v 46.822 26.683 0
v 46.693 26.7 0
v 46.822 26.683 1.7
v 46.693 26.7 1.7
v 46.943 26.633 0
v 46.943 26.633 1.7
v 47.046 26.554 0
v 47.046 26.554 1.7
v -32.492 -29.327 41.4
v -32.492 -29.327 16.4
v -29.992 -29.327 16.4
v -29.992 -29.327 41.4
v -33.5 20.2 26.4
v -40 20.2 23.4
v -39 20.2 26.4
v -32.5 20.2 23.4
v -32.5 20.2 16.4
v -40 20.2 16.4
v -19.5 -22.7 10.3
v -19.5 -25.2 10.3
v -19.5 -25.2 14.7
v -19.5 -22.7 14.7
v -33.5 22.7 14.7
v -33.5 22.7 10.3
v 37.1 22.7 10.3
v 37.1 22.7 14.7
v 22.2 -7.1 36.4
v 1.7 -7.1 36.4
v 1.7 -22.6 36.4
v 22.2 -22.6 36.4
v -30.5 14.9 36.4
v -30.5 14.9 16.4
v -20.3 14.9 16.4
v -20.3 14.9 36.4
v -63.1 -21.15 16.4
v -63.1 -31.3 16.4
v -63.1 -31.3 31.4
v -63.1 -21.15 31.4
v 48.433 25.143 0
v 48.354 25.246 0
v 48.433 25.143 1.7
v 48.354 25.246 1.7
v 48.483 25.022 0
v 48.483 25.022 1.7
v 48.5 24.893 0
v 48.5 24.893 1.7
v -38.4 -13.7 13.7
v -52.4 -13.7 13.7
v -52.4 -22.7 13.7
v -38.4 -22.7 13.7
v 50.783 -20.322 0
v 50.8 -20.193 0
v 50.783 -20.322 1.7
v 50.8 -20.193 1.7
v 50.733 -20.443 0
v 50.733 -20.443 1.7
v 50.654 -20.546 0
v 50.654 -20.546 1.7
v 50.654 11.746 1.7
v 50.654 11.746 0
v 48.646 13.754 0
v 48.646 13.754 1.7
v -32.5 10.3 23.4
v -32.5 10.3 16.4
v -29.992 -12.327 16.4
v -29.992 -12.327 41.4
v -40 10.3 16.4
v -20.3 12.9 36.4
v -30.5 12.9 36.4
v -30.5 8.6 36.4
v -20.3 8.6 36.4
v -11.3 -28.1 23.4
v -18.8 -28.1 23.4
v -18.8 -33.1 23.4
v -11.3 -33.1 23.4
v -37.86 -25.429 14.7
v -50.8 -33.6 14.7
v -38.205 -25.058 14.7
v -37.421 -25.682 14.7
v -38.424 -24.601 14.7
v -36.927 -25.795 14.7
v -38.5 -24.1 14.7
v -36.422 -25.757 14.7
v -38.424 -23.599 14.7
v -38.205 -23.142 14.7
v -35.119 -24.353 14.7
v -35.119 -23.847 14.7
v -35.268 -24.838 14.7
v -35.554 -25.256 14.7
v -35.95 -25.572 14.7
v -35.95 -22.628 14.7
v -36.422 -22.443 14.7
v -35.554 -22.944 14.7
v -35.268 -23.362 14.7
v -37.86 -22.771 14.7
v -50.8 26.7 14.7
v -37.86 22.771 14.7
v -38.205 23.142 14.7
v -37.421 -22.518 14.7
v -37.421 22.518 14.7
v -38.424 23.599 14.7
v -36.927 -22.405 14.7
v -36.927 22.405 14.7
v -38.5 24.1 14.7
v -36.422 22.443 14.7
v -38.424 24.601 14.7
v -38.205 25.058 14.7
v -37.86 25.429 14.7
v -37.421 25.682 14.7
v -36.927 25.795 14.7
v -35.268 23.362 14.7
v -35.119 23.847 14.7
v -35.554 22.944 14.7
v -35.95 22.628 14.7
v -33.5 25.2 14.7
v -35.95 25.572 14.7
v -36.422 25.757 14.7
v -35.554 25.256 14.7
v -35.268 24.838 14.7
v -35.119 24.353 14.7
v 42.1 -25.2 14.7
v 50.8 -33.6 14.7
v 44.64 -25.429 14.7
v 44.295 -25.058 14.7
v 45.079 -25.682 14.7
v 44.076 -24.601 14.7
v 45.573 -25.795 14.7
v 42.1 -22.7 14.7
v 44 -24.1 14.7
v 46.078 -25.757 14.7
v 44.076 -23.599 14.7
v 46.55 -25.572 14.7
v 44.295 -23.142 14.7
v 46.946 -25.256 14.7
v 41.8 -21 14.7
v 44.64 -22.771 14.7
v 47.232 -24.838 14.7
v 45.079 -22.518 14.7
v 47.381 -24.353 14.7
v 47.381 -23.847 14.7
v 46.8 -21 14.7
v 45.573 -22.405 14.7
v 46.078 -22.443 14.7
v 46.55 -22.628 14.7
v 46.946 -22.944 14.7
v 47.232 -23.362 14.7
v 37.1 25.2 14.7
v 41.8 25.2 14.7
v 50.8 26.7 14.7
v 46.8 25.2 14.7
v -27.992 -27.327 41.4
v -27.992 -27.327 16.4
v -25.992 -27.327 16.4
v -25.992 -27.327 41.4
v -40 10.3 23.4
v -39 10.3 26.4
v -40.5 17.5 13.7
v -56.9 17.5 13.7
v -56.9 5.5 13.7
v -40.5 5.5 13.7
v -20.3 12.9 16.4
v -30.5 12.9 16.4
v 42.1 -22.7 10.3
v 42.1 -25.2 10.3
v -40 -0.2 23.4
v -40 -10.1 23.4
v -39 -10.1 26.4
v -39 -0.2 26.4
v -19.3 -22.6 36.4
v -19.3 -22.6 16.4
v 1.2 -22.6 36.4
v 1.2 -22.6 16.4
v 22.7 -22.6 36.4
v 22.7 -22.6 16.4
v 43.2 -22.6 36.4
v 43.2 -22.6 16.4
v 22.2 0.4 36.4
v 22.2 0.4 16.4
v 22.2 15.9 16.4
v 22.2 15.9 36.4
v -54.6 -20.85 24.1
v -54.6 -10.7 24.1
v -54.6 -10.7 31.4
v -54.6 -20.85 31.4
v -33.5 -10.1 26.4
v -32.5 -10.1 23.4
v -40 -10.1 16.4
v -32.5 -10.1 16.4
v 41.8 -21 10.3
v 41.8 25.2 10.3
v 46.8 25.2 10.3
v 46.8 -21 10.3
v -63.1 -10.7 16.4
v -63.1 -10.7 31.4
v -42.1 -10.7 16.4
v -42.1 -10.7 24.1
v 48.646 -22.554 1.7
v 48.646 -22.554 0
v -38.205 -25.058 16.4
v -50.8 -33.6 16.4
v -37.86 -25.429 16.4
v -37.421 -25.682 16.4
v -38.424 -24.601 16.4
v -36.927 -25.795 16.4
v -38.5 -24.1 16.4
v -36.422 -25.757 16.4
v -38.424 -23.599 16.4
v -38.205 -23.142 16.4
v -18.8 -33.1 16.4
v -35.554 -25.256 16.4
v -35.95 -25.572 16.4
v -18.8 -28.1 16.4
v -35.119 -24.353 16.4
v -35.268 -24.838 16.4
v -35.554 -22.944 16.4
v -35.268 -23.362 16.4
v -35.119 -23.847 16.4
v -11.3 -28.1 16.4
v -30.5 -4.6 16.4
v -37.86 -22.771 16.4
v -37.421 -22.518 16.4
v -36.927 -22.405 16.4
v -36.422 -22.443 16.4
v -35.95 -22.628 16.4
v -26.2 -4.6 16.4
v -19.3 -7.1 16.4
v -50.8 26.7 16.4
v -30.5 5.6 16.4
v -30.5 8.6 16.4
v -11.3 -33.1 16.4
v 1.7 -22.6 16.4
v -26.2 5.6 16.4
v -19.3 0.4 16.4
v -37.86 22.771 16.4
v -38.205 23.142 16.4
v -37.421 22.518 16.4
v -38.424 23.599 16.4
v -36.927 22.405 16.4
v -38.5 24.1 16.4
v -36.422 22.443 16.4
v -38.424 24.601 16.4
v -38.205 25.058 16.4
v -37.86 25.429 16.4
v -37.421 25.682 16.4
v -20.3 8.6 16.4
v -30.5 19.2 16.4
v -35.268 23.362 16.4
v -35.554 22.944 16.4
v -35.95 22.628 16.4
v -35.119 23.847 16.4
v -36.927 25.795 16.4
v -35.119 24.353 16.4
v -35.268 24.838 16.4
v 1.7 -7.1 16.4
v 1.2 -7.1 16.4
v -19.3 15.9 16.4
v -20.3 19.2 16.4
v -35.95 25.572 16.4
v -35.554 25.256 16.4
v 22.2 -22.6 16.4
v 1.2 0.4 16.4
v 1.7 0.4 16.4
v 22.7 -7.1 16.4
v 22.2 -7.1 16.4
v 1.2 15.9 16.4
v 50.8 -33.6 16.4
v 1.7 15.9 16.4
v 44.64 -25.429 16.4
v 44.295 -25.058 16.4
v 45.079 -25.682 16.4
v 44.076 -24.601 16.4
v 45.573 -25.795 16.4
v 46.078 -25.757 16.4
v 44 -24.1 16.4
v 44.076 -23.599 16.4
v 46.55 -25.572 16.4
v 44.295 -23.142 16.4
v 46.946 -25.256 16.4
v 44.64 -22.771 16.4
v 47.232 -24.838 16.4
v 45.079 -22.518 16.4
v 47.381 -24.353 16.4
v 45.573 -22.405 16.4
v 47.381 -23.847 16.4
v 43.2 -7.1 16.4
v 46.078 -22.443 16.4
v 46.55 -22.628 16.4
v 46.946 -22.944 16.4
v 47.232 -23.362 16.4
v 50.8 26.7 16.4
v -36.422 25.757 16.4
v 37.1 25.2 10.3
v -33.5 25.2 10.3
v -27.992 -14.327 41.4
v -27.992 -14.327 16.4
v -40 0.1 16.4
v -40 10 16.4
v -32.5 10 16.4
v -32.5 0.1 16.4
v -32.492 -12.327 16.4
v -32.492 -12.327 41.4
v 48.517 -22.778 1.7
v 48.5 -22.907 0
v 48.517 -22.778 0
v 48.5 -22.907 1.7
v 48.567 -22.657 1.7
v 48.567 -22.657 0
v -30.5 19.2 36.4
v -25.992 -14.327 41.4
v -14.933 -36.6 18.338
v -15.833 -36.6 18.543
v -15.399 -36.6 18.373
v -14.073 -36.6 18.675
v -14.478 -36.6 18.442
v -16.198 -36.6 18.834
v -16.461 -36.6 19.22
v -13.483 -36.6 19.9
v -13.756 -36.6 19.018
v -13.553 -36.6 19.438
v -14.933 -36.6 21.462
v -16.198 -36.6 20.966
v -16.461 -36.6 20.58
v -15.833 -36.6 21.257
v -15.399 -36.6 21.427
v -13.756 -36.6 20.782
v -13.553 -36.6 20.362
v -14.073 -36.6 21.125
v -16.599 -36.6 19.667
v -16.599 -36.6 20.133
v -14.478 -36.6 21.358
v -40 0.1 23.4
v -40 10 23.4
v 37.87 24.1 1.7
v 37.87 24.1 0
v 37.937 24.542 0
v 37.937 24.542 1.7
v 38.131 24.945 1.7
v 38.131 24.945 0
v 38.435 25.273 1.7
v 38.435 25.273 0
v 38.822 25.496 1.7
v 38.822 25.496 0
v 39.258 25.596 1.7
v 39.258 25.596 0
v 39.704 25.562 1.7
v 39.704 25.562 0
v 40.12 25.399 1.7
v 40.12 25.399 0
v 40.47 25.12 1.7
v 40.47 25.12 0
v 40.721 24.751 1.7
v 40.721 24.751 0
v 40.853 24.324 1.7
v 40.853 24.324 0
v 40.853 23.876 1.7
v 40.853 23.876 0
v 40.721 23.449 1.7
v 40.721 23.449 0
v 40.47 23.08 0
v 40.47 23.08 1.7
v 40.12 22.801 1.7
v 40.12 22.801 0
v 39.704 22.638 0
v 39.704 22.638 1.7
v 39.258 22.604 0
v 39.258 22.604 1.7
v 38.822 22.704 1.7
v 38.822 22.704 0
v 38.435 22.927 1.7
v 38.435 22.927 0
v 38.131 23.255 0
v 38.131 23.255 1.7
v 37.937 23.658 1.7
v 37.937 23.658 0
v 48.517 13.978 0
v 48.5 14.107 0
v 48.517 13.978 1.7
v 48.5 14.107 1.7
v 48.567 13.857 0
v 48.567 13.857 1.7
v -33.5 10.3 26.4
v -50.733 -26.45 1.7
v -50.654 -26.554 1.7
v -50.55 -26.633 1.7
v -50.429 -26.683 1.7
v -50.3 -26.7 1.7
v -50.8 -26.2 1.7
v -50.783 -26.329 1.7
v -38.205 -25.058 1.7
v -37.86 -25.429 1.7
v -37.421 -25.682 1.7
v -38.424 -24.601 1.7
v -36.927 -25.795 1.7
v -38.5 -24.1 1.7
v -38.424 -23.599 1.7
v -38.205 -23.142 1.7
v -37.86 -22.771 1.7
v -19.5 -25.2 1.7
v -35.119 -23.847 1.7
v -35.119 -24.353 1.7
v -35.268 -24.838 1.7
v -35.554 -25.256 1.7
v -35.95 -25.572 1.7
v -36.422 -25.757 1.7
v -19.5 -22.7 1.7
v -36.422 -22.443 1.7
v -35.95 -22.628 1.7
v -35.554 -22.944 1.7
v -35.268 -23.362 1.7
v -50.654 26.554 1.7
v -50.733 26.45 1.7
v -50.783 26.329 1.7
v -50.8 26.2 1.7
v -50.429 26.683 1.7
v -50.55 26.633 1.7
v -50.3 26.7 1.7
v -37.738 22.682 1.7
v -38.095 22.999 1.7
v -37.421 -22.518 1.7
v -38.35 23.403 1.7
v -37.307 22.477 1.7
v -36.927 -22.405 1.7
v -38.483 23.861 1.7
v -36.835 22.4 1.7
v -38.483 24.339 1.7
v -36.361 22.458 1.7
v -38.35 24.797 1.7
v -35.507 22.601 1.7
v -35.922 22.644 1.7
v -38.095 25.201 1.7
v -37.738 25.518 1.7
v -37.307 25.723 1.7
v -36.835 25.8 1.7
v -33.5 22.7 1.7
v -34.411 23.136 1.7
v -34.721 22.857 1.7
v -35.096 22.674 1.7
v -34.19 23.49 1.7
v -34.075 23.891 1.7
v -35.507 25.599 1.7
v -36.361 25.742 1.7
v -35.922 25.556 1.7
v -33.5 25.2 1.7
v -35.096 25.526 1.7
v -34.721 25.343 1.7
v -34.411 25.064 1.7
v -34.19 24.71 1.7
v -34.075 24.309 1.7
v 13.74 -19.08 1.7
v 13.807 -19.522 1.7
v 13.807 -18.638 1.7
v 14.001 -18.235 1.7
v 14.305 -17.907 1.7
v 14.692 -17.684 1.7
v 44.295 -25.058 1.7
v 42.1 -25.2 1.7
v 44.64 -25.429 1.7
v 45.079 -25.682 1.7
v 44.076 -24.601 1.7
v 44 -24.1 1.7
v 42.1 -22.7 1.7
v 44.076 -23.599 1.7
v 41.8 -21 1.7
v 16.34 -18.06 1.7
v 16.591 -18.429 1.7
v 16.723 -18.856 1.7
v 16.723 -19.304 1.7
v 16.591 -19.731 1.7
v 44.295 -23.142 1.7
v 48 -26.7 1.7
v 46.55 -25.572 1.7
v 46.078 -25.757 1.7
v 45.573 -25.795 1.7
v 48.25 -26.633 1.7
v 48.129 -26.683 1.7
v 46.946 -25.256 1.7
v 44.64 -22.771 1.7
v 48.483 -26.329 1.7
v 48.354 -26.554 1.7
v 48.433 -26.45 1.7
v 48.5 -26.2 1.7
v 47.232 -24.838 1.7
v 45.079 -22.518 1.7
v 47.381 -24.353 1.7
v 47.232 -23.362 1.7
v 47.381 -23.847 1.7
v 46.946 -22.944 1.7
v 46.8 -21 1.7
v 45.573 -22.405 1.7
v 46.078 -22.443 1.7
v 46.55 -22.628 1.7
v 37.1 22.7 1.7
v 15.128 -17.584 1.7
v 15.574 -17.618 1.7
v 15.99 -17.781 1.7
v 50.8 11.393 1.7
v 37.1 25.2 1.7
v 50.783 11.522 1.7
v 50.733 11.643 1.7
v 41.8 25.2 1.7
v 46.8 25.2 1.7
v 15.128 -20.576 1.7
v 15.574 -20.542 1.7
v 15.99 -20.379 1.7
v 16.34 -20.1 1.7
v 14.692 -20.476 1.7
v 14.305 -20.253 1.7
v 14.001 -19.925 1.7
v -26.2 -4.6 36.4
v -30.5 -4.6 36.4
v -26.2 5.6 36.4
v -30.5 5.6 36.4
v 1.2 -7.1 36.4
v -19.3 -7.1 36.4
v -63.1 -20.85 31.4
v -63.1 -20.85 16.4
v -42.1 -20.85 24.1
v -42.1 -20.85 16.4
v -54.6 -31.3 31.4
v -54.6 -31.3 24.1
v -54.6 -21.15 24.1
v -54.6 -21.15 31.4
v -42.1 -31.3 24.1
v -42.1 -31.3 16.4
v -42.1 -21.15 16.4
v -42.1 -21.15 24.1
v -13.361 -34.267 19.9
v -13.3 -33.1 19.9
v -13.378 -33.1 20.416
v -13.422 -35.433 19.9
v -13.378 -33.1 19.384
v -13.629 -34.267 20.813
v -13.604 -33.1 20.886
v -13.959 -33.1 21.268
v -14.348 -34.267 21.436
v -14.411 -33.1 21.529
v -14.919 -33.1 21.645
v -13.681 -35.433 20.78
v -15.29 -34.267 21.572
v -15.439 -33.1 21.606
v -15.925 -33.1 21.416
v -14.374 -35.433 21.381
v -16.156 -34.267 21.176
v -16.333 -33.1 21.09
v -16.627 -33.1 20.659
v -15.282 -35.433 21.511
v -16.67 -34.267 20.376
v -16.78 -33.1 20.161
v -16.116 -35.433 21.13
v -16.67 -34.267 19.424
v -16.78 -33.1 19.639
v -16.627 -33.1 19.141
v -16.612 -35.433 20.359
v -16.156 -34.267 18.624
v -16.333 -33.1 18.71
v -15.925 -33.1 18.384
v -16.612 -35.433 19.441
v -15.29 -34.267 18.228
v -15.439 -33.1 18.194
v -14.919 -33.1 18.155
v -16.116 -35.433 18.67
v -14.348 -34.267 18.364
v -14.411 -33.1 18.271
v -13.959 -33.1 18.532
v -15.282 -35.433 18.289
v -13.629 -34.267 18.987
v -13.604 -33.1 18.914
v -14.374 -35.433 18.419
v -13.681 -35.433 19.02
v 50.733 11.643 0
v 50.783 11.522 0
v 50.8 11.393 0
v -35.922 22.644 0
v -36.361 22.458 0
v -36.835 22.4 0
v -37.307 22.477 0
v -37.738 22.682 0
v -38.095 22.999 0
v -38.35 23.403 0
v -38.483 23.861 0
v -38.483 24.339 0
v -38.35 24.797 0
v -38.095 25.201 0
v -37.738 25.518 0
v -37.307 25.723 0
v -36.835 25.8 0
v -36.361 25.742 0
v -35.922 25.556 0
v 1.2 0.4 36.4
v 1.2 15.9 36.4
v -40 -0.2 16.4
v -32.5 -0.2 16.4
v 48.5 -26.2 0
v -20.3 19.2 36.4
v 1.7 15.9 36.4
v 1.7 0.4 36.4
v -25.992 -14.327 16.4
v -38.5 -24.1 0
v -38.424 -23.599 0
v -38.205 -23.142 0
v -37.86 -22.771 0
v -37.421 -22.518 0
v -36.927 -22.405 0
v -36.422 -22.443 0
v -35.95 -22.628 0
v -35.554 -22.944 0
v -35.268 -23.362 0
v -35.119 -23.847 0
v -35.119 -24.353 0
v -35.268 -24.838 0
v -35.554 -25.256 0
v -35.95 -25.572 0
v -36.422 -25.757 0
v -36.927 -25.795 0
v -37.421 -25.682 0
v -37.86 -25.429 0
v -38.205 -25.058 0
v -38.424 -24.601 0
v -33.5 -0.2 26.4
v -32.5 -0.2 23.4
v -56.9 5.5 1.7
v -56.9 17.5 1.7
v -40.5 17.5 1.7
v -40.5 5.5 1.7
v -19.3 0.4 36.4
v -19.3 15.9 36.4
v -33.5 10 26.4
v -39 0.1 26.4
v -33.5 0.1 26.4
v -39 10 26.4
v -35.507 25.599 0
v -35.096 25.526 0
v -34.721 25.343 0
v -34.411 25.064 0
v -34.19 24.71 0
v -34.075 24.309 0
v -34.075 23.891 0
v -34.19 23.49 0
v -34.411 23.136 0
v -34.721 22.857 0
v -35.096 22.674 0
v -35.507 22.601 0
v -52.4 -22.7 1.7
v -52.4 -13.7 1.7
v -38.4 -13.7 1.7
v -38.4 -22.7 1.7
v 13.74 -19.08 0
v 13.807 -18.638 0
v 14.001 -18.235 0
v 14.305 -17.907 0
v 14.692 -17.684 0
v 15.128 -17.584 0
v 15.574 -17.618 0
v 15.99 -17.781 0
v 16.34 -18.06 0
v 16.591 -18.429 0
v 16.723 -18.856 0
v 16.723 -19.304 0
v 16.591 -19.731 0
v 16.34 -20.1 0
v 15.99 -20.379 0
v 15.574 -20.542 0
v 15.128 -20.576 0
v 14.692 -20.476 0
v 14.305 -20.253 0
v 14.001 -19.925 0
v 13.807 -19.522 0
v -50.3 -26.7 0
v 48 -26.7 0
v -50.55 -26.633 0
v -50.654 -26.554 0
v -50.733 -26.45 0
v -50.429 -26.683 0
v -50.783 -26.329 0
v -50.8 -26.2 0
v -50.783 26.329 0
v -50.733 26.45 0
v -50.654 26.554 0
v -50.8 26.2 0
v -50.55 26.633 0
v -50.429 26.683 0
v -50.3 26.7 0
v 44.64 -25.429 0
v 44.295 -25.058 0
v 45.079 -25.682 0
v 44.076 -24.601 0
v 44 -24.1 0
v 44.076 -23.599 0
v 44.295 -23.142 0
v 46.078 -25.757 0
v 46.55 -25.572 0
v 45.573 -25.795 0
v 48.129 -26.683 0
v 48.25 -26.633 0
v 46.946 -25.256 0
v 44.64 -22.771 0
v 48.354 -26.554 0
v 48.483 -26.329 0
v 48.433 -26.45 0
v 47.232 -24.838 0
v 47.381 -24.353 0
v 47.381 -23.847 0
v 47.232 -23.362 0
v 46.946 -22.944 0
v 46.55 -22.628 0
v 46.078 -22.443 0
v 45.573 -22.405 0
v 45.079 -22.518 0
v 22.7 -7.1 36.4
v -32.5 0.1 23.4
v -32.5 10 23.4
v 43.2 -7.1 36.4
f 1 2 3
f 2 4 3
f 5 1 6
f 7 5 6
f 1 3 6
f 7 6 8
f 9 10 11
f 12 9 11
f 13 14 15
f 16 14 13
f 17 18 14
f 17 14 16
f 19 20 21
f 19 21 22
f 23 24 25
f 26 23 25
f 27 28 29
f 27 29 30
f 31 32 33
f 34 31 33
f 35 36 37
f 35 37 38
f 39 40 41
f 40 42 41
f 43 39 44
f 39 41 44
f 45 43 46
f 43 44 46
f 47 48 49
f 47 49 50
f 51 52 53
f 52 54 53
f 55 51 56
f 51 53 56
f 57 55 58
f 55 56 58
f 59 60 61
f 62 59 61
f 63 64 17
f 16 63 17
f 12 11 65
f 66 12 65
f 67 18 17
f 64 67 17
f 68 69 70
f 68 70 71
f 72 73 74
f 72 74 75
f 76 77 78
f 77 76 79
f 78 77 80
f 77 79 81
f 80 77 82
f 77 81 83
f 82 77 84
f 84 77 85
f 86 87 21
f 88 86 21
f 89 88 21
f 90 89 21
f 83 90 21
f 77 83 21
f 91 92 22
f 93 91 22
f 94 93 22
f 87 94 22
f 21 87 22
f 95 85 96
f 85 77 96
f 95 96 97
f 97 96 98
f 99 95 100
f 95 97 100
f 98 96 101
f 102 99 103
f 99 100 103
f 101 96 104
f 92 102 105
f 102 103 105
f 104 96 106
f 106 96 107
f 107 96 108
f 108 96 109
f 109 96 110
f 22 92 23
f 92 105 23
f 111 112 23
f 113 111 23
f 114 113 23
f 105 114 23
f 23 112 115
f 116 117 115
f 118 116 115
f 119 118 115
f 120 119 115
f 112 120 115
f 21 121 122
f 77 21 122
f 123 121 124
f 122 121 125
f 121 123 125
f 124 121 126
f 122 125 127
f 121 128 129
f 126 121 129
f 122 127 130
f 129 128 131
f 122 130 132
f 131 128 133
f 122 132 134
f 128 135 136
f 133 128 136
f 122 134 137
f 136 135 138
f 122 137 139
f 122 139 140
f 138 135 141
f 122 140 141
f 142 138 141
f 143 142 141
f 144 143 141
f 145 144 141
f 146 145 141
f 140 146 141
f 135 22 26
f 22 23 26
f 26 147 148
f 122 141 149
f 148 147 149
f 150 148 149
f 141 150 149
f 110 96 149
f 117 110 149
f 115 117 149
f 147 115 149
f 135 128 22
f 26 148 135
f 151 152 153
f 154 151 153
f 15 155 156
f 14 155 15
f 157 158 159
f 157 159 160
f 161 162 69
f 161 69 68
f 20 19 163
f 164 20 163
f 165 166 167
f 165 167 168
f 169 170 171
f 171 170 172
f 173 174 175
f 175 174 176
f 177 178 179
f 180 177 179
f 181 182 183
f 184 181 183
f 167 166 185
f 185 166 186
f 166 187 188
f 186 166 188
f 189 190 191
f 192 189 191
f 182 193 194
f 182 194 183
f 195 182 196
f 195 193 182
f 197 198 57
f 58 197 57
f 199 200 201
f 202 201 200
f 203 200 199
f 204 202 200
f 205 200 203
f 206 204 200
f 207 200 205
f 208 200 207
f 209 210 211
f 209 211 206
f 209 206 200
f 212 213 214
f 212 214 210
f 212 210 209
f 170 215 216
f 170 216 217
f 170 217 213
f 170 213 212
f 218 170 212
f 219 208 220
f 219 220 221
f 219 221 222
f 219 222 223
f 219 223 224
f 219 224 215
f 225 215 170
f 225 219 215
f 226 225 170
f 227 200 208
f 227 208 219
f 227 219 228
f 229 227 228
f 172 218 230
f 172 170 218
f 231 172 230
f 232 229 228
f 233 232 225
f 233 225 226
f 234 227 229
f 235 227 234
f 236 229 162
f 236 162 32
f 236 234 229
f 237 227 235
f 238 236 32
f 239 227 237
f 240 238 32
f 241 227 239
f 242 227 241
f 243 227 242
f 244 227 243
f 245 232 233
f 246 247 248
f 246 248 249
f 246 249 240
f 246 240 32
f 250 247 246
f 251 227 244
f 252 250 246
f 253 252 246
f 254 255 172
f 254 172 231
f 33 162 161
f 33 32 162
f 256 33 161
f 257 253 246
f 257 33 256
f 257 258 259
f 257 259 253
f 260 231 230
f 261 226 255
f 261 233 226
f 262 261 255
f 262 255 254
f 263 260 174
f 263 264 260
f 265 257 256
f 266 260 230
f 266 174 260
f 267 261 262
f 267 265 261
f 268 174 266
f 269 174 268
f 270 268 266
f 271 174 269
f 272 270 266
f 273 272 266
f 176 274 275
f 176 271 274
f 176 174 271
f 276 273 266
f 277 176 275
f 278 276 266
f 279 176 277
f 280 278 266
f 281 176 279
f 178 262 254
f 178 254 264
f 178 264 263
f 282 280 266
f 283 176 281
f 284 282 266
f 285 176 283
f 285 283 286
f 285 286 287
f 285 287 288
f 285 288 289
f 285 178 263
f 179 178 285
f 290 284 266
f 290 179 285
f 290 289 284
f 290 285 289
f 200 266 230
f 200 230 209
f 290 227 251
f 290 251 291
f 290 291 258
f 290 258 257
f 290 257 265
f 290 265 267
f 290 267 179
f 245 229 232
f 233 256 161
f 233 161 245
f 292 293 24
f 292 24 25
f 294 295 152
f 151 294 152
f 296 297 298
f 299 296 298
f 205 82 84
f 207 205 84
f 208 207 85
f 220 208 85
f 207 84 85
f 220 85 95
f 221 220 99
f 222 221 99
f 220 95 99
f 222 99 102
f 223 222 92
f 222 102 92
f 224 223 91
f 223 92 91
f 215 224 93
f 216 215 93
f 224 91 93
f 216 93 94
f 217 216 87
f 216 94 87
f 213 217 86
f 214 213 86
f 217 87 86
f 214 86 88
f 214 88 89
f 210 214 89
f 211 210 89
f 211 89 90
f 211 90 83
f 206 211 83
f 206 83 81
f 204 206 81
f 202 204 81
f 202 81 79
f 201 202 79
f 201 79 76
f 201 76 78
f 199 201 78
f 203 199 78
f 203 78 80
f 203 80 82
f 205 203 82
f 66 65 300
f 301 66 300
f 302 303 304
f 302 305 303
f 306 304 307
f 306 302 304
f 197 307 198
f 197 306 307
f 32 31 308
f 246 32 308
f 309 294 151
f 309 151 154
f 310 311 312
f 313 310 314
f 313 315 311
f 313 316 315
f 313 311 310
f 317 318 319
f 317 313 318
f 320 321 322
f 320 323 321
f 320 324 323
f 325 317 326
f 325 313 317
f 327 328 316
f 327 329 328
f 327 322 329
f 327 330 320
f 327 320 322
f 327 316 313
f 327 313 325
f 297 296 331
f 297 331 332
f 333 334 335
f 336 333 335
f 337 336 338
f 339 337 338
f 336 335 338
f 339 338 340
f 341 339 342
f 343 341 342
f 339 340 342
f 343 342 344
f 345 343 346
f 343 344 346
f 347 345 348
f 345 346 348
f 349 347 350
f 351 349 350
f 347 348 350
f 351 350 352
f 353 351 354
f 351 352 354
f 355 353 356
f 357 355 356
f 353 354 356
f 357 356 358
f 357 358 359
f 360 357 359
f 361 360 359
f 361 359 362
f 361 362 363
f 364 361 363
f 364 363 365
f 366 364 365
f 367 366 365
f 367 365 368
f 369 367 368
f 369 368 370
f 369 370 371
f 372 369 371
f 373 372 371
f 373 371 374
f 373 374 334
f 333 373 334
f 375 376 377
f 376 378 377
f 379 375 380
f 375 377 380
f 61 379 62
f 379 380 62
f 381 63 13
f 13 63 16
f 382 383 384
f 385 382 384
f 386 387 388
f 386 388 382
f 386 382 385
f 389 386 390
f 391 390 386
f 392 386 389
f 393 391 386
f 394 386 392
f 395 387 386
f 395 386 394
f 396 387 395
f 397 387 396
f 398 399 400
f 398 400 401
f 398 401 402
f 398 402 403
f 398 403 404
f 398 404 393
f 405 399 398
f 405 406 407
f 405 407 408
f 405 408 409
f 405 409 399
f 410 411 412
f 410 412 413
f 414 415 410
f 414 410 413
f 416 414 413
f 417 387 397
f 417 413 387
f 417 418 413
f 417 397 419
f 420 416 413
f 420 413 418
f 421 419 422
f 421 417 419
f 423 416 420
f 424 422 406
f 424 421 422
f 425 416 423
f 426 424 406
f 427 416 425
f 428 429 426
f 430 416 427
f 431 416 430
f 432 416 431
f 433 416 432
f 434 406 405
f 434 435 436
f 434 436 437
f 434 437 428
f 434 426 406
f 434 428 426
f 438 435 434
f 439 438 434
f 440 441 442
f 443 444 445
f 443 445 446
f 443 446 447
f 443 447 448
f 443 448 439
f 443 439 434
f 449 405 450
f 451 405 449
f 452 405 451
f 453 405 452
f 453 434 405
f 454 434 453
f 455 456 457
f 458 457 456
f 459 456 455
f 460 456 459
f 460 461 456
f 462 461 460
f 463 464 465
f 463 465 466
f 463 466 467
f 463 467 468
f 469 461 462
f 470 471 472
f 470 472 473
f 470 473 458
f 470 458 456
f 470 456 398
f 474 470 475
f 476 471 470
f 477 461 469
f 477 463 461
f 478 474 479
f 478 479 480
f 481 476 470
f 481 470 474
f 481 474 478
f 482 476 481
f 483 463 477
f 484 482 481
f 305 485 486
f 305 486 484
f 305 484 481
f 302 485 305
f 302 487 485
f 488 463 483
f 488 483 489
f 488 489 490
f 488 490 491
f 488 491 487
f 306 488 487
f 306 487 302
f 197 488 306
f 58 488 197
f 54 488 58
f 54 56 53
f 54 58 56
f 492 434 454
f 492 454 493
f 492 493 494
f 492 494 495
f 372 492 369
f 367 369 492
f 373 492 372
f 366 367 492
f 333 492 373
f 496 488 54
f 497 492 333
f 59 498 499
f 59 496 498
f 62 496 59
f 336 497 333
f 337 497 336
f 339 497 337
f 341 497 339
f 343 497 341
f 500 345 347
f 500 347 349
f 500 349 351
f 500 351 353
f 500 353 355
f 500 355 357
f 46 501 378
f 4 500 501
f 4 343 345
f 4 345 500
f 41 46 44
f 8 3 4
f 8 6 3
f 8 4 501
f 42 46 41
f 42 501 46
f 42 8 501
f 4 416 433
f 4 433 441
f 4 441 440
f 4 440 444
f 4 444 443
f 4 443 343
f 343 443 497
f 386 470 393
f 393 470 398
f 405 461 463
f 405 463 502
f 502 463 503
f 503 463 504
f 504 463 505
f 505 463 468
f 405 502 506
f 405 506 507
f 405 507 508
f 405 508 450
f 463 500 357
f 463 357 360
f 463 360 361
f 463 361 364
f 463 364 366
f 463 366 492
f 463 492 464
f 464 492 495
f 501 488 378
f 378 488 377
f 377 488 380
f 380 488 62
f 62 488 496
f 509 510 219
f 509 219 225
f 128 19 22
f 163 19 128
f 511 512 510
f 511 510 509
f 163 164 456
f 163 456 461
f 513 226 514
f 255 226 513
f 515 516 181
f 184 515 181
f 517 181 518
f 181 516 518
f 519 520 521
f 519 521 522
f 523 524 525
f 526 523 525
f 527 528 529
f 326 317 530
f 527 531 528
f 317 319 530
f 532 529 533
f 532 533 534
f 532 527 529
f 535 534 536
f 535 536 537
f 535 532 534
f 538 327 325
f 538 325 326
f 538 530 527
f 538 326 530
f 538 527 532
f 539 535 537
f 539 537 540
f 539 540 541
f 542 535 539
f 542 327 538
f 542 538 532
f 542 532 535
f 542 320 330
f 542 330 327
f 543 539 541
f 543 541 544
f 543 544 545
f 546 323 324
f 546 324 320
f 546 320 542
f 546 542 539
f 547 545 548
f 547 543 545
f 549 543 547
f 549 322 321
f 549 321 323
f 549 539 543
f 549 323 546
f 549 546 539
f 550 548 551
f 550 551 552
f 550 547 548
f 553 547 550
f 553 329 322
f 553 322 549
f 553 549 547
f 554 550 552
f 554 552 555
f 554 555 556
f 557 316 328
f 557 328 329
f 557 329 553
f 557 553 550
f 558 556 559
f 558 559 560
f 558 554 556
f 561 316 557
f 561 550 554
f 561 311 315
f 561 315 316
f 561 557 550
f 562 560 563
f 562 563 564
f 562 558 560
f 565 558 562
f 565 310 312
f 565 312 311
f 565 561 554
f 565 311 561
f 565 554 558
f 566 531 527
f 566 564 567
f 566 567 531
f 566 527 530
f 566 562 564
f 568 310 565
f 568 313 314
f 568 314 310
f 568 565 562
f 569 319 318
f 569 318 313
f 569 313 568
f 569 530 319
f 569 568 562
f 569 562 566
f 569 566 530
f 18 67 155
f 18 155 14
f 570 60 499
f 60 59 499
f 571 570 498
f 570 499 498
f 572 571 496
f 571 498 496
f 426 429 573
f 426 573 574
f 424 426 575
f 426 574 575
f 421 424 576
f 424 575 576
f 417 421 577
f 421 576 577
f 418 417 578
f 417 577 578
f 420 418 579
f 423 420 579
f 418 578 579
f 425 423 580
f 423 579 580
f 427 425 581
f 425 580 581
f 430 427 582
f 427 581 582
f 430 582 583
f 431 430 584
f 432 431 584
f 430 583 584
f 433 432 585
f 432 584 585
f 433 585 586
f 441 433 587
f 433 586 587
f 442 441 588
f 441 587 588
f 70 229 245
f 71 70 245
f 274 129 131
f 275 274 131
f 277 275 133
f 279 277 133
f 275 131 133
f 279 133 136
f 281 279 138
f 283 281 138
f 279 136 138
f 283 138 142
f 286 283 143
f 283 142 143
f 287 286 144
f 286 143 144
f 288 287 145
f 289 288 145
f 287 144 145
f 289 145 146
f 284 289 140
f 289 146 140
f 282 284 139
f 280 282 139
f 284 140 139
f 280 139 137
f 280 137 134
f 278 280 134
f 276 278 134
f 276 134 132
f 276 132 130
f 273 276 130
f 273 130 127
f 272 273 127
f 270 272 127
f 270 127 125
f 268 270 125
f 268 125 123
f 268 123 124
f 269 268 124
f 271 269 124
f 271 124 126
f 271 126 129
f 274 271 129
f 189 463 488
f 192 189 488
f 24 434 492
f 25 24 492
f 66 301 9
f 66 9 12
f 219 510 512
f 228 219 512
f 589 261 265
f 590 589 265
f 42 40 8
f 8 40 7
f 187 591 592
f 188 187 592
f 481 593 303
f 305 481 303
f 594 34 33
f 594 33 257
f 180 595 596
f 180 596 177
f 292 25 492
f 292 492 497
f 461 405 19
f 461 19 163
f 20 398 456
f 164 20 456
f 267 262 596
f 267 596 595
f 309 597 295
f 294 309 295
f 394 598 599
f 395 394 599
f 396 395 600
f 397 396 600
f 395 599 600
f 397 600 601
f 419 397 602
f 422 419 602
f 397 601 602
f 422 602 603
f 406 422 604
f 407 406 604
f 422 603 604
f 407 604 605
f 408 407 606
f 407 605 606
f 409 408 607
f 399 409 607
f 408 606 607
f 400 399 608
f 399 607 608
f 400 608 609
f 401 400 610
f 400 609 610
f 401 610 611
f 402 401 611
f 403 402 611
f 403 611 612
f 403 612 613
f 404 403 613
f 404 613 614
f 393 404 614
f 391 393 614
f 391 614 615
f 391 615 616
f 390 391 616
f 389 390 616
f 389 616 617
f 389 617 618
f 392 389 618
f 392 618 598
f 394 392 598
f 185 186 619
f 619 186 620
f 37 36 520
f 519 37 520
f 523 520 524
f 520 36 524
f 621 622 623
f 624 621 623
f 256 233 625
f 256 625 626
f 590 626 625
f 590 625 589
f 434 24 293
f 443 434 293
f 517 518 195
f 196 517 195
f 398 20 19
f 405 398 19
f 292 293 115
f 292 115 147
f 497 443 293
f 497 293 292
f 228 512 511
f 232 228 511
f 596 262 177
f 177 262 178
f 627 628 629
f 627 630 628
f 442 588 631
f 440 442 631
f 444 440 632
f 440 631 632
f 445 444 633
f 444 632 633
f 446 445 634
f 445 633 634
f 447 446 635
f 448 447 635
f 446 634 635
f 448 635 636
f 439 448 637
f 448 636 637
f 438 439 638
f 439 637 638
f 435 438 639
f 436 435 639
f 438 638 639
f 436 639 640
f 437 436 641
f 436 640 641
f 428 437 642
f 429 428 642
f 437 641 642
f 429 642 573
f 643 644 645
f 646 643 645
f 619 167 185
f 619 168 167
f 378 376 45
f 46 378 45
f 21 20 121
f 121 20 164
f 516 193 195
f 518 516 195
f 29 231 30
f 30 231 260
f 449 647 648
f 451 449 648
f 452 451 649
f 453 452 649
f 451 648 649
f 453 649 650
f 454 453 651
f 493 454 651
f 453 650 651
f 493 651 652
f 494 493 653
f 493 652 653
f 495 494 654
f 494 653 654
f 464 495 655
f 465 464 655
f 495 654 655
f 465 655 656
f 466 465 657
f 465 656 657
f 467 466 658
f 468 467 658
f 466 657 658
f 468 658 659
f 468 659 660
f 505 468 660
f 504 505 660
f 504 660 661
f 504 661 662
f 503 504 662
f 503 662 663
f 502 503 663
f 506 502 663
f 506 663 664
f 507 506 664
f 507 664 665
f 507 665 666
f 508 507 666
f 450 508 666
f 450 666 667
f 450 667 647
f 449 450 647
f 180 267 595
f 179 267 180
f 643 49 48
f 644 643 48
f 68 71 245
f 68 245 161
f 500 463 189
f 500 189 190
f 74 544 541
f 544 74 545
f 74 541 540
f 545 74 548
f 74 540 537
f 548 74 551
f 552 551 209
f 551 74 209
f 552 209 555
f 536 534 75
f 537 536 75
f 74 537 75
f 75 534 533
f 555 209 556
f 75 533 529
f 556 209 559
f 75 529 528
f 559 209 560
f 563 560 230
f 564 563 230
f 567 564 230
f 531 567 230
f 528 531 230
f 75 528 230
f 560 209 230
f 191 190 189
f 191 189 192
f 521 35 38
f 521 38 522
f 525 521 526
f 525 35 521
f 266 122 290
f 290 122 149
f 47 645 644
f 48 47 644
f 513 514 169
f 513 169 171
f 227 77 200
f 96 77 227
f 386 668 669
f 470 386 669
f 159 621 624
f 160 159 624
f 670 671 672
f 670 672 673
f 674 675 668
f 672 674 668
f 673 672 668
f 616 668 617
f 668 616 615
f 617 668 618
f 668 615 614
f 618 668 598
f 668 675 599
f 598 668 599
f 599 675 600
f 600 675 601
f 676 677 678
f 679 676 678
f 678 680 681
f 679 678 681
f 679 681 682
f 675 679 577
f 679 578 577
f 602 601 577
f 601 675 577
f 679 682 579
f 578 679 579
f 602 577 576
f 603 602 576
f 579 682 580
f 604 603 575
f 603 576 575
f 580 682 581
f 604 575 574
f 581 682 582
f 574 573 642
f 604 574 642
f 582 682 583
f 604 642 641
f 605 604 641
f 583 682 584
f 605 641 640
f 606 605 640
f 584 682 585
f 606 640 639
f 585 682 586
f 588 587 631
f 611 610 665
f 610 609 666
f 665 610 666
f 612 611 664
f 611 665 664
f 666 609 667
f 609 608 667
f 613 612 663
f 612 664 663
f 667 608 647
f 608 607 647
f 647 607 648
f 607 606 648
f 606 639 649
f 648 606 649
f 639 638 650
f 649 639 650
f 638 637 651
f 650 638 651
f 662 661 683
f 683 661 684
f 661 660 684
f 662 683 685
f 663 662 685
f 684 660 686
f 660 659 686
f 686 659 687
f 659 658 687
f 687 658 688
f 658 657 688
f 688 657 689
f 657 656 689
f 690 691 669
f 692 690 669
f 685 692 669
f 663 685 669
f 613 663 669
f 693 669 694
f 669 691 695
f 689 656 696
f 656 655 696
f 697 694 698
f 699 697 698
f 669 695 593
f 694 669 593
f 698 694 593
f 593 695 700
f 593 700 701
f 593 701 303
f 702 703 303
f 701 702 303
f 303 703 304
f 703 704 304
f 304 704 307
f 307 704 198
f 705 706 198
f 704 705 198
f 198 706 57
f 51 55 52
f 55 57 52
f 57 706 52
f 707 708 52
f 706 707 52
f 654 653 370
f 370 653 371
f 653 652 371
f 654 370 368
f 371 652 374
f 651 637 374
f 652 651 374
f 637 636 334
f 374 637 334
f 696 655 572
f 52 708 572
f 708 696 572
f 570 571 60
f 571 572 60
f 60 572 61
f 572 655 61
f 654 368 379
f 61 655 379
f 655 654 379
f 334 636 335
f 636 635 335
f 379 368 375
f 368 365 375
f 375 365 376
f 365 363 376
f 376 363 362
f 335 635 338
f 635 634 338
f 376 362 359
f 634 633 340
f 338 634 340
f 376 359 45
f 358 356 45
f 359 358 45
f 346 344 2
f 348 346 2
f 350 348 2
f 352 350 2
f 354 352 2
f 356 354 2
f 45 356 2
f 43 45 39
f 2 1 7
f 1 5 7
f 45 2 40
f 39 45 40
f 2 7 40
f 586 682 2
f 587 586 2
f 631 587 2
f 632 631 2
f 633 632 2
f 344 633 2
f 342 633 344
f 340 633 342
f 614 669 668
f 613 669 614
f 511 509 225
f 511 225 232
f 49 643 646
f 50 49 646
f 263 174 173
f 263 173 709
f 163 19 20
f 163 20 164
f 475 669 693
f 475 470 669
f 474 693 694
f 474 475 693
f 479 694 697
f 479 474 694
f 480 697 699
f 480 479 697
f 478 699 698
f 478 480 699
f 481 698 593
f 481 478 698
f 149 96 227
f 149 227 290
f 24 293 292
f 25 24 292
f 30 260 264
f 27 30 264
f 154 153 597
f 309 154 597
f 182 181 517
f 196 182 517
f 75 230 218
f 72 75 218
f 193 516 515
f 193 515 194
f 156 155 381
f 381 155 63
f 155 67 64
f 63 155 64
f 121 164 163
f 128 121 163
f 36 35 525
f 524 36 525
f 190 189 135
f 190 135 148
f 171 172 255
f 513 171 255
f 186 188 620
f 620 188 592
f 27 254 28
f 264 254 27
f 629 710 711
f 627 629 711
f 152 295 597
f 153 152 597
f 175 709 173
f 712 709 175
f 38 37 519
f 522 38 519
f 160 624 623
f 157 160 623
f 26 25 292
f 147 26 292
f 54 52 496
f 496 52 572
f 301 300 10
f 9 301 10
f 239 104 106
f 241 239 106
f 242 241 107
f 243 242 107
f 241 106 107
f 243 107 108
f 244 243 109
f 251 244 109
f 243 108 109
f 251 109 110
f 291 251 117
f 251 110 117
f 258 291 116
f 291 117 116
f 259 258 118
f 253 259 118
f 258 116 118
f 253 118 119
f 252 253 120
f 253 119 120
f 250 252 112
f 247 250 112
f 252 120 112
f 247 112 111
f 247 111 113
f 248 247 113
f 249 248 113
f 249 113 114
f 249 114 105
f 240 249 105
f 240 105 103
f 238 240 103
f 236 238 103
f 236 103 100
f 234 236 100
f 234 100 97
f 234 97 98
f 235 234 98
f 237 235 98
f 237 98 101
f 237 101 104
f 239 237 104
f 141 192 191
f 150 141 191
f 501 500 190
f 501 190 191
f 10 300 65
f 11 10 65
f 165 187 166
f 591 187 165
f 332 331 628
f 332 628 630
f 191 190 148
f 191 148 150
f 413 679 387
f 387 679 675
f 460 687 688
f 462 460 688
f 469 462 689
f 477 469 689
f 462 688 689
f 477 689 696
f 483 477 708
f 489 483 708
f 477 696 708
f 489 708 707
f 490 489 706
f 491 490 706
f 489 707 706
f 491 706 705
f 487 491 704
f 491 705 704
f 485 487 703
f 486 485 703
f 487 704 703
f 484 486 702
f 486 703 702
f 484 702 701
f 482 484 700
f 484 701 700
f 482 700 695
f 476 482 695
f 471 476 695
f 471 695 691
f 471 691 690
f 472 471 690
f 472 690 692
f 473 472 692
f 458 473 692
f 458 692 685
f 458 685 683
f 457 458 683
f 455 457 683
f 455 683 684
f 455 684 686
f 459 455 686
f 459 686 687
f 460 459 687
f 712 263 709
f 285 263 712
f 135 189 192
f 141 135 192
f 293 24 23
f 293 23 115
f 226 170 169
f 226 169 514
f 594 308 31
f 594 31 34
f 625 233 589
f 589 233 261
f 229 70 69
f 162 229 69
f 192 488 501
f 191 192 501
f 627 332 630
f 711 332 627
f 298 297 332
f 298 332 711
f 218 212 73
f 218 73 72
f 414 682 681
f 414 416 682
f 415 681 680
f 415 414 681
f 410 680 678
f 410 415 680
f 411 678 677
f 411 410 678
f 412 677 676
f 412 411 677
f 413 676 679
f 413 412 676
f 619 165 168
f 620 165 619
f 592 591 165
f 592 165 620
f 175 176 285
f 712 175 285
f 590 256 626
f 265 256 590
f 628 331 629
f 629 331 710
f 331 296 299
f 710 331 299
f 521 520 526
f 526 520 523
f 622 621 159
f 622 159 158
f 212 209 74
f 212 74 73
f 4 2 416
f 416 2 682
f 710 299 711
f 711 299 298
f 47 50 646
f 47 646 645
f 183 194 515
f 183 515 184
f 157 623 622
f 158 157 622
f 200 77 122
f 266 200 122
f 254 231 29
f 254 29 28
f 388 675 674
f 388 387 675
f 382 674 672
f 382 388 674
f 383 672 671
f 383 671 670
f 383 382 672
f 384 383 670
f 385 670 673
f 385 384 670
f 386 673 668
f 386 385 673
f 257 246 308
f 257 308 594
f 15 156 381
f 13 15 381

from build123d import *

# Parameters (mm, degrees)
F1_DEPTH    = 1.7
F3_D        = 3
F4_R        = 0.5
F5_W        = 6.1
F5_H        = 12
F5_W_2      = 10.3
F6_DEPTH    = 12
F5_W_3      = 12.4
F5_H_2      = 9
F5_W_4      = 1.6
F7_W        = 70.6
F7_H        = 2.5
F7_W_2      = 5
F7_H_2      = 46.2
F7_W_3      = 61.6
F8_DEPTH    = 8.6
F9_W        = 5
F9_H        = 46.2
F10_DEPTH   = 4.4
F9_W_2      = 61.6
F9_H_2      = 2.5
F9_W_3      = 70.6
F11_W       = 101.6
F11_H       = 60.3
F12_DEPTH   = 1.7
F14_D       = 3.4
F14_2_D     = 3.4
F15_W       = 21
F15_H       = 10.15
F16_DEPTH   = 15
F17_W       = 12.5
F17_H       = 7.3
F18_DEPTH   = 20.6
F19_W       = 7.5
F19_H       = 9.9
F20_DEPTH   = 10
F21_SIZE2   = 3
F21_SIZE    = 1
F21_2_SIZE2 = 3
F21_2_SIZE  = 1
F21_3_SIZE2 = 3
F21_3_SIZE  = 1
F22_W       = 10.2
F22_H       = 4.3
F22_W_2     = 4.3
F22_H_2     = 10.2
F22_W_3     = 20.5
F22_H_3     = 15.5
F23_DEPTH   = 20
F25_DEPTH   = 25
F26_W       = 7.5
F26_H       = 5
F27_DEPTH   = 7
F28_R       = 1.75
F29_DEPTH   = 3.5
F29_TAPER   = 3


with BuildPart() as f1:
    # F0 (on Top) → F1 (new body)
    with BuildSketch(Plane.XY):
        Polygon((46.9, 26.7), (-50.8, 26.7), (-50.8, -26.7), (48.5, -26.7), (48.5, -22.7), (50.8, -20.4), (50.8, 11.6), (48.5, 13.9), (48.5, 25.1), align=None)
    extrude(amount=F1_DEPTH)

    # F3 (through all)
    with Locations(Plane.XY.offset(1.7)):
        with Locations((-35.56, 24.1), (39.37, 24.1), (15.24, -19.08), (45.72, -24.16), (-36.83, -24.16)):
            Hole(F3_D / 2)

    # F4
    f4_edges = [f1.edges().sort_by_distance(p)[0] for p in [
        (-50.8, 26.7, 0.85),
        (-50.8, -26.7, 0.85),
        (48.5, -26.7, 0.85),
        (48.5, -22.7, 0.85),
        (50.8, -20.4, 0.85),
        (50.8, 11.6, 0.85),
        (48.5, 13.9, 0.85),
        (48.5, 25.1, 0.85),
        (46.9, 26.7, 0.85),
    ]]
    fillet(f4_edges, radius=F4_R)

    # F7 (on face) → F8 (join)
    with BuildSketch(Plane.XY.offset(1.7)):
        with Locations((1.8, 23.95)):
            Rectangle(F7_W, F7_H)
        with Locations((44.3, 2.1)):
            Rectangle(F7_W_2, F7_H_2)
        with Locations((11.3, -23.95)):
            Rectangle(F7_W_3, F7_H)
    extrude(amount=F8_DEPTH)

    # F14 (through all)
    with Locations(Plane.XY.offset(16.4)):
        with Locations((-36.8, -24.1), (-36.8, 24.1), (45.7, -24.1)):
            Hole(F14_D / 2)


with BuildPart() as f6:
    # F5 (on face) → F6 (new body)
    with BuildSketch(Plane.XY.offset(1.7)):
        with Locations((-53.85, 11.5)):
            Rectangle(F5_W, F5_H)
        with Locations((-45.65, 11.5)):
            Rectangle(F5_W_2, F5_H)
    extrude(amount=F6_DEPTH)


with BuildPart() as f6b:
    # F5 (on face) → F6, piece 2 (new body)
    with BuildSketch(Plane.XY.offset(1.7)):
        with Locations((-44.6, -18.2)):
            Rectangle(F5_W_3, F5_H_2)
        with Locations((-51.6, -18.2)):
            Rectangle(F5_W_4, F5_H_2)
    extrude(amount=F6_DEPTH)


with BuildPart() as f10:
    # F9 (on face) → F10 (new body)
    with BuildSketch(Plane.XY.offset(10.3)):
        with Locations((44.3, 2.1)):
            Rectangle(F9_W, F9_H)
    extrude(amount=F10_DEPTH)



with BuildPart() as f10b:
    # F9 (on face) → F10, piece 2 (new body)
    with BuildSketch(Plane.XY.offset(10.3)):
        with Locations((11.3, -23.95)):
            Rectangle(F9_W_2, F9_H_2)
    extrude(amount=F10_DEPTH)


with BuildPart() as f10c:
    # F9 (on face) → F10, piece 3 (new body)
    with BuildSketch(Plane.XY.offset(10.3)):
        with Locations((1.8, 23.95)):
            Rectangle(F9_W_3, F9_H_2)
    extrude(amount=F10_DEPTH)


with BuildPart() as f10_1:
    add(f10.part)

    add(f10b.part)  # F12 merges F10b

    add(f10c.part)  # F12 merges F10c
    # F11 (on face) → F12 (join)
    with BuildSketch(Plane.XY.offset(14.7)):
        with Locations((0, -3.45)):
            Rectangle(F11_W, F11_H)
    extrude(amount=F12_DEPTH)

    # F14#2 (through all)
    with Locations(Plane.XY.offset(16.4)):
        with Locations((-36.8, -24.1), (-36.8, 24.1), (45.7, -24.1)):
            Hole(F14_2_D / 2)

    # F22 (on face) → F23 (join)
    with BuildSketch(Plane.XY.offset(16.4)):
        with Locations((-25.4, 17.05)):
            Rectangle(F22_W, F22_H)
        with Locations((-25.4, 10.75)):
            Rectangle(F22_W, F22_H)
        with Locations((-28.35, 0.5)):
            Rectangle(F22_W_2, F22_H_2)
        with Locations((-9.05, 8.15)):
            Rectangle(F22_W_3, F22_H_3)
        with Locations((11.95, 8.15)):
            Rectangle(F22_W_3, F22_H_3)
        with Locations((-9.05, -14.85)):
            Rectangle(F22_W_3, F22_H_3)
        with Locations((11.95, -14.85)):
            Rectangle(F22_W_3, F22_H_3)
        with Locations((32.95, -14.85)):
            Rectangle(F22_W_3, F22_H_3)
    extrude(amount=F23_DEPTH)

    # F26 (on face) → F27 (join)
    with BuildSketch(Plane.XY.offset(16.4)):
        with Locations((-15.05, -30.6)):
            Rectangle(F26_W, F26_H)
    extrude(amount=F27_DEPTH)

    # F28 (on face) → F29 (join)
    with BuildSketch(Plane.XZ.offset(33.1)):
        with Locations((-15.05, 19.9)):
            Circle(F28_R)
    extrude(amount=F29_DEPTH, taper=F29_TAPER)


with BuildPart() as f16:
    # F15 (on face) → F16 (new body)
    with BuildSketch(Plane.XY.offset(16.4)):
        with Locations((-52.6, -26.225)):
            Rectangle(F15_W, F15_H)
    extrude(amount=F16_DEPTH)


with BuildPart() as f16b:
    # F15 (on face) → F16, piece 2 (new body)
    with BuildSketch(Plane.XY.offset(16.4)):
        with Locations((-52.6, -15.775)):
            Rectangle(F15_W, F15_H)
    extrude(amount=F16_DEPTH)


with BuildPart() as f18_tool:
    # F17 (on face) → F18 (new body, through all)
    with BuildSketch(Plane.XZ.offset(31.3)):
        with Locations((-48.35, 27.75)):
            Rectangle(F17_W, F17_H)
    extrude(amount=-F18_DEPTH)


with BuildPart() as f16_1:
    add(f16.part)

    # F18: cut by f18_tool
    add(f18_tool.part, mode=Mode.SUBTRACT)


with BuildPart() as f16b_1:
    add(f16b.part)

    # F18: cut by f18_tool
    add(f18_tool.part, mode=Mode.SUBTRACT)


with BuildPart() as f20:
    # F19 (on face) → F20 (new body)
    with BuildSketch(Plane.XY.offset(16.4)):
        with Locations((-36.25, 15.25)):
            Rectangle(F19_W, F19_H)
    extrude(amount=F20_DEPTH)

    # F21
    f21_edges = [f20.edges().sort_by_distance(p)[0] for p in [
        (-40, 15.25, 26.4),
        (-32.5, 15.25, 26.4),
    ]]
    f21_side = f20.faces().sort_by_distance((-36.25, 15.25, 26.4))[0]
    chamfer(f21_edges, length=F21_SIZE, length2=F21_SIZE2, reference=f21_side)


with BuildPart() as f20b:
    # F19 (on face) → F20, piece 2 (new body)
    with BuildSketch(Plane.XY.offset(16.4)):
        with Locations((-36.25, 5.05)):
            Rectangle(F19_W, F19_H)
    extrude(amount=F20_DEPTH)

    # F21#2
    f21_2_edges = [f20b.edges().sort_by_distance(p)[0] for p in [
        (-40, 5.05, 26.4),
        (-32.5, 5.05, 26.4),
    ]]
    f21_2_side = f20b.faces().sort_by_distance((-36.25, 5.05, 26.4))[0]
    chamfer(f21_2_edges, length=F21_2_SIZE, length2=F21_2_SIZE2, reference=f21_2_side)


with BuildPart() as f20c:
    # F19 (on face) → F20, piece 3 (new body)
    with BuildSketch(Plane.XY.offset(16.4)):
        with Locations((-36.25, -5.15)):
            Rectangle(F19_W, F19_H)
    extrude(amount=F20_DEPTH)

    # F21#3
    f21_3_edges = [f20c.edges().sort_by_distance(p)[0] for p in [
        (-40, -5.15, 26.4),
        (-32.5, -5.15, 26.4),
    ]]
    f21_3_side = f20c.faces().sort_by_distance((-36.25, -5.15, 26.4))[0]
    chamfer(f21_3_edges, length=F21_3_SIZE, length2=F21_3_SIZE2, reference=f21_3_side)


with BuildPart() as f25:
    # F24 (on face) → F25 (new body)
    with BuildSketch(Plane.XY.offset(16.4)):
        Polygon((-27.9916506261, -14.3273180723), (-27.9916506261, -20.8273180723), (-27.9916506261, -27.3273180723), (-25.9916506261, -27.3273180723), (-25.9916506261, -14.3273180723), align=None)
    extrude(amount=F25_DEPTH)


with BuildPart() as f25b:
    # F24 (on face) → F25, piece 2 (new body)
    with BuildSketch(Plane.XY.offset(16.4)):
        Polygon((-29.9916506261, -12.3273180723), (-32.4916506261, -12.3273180723), (-32.4916506261, -29.3273180723), (-29.9916506261, -29.3273180723), (-29.9916506261, -20.8273180723), align=None)
    extrude(amount=F25_DEPTH)


solid = Compound([f1.part, f6.part, f6b.part, f10_1.part, f16_1.part, f16b_1.part, f20.part, f20b.part, f20c.part, f25.part, f25b.part])
